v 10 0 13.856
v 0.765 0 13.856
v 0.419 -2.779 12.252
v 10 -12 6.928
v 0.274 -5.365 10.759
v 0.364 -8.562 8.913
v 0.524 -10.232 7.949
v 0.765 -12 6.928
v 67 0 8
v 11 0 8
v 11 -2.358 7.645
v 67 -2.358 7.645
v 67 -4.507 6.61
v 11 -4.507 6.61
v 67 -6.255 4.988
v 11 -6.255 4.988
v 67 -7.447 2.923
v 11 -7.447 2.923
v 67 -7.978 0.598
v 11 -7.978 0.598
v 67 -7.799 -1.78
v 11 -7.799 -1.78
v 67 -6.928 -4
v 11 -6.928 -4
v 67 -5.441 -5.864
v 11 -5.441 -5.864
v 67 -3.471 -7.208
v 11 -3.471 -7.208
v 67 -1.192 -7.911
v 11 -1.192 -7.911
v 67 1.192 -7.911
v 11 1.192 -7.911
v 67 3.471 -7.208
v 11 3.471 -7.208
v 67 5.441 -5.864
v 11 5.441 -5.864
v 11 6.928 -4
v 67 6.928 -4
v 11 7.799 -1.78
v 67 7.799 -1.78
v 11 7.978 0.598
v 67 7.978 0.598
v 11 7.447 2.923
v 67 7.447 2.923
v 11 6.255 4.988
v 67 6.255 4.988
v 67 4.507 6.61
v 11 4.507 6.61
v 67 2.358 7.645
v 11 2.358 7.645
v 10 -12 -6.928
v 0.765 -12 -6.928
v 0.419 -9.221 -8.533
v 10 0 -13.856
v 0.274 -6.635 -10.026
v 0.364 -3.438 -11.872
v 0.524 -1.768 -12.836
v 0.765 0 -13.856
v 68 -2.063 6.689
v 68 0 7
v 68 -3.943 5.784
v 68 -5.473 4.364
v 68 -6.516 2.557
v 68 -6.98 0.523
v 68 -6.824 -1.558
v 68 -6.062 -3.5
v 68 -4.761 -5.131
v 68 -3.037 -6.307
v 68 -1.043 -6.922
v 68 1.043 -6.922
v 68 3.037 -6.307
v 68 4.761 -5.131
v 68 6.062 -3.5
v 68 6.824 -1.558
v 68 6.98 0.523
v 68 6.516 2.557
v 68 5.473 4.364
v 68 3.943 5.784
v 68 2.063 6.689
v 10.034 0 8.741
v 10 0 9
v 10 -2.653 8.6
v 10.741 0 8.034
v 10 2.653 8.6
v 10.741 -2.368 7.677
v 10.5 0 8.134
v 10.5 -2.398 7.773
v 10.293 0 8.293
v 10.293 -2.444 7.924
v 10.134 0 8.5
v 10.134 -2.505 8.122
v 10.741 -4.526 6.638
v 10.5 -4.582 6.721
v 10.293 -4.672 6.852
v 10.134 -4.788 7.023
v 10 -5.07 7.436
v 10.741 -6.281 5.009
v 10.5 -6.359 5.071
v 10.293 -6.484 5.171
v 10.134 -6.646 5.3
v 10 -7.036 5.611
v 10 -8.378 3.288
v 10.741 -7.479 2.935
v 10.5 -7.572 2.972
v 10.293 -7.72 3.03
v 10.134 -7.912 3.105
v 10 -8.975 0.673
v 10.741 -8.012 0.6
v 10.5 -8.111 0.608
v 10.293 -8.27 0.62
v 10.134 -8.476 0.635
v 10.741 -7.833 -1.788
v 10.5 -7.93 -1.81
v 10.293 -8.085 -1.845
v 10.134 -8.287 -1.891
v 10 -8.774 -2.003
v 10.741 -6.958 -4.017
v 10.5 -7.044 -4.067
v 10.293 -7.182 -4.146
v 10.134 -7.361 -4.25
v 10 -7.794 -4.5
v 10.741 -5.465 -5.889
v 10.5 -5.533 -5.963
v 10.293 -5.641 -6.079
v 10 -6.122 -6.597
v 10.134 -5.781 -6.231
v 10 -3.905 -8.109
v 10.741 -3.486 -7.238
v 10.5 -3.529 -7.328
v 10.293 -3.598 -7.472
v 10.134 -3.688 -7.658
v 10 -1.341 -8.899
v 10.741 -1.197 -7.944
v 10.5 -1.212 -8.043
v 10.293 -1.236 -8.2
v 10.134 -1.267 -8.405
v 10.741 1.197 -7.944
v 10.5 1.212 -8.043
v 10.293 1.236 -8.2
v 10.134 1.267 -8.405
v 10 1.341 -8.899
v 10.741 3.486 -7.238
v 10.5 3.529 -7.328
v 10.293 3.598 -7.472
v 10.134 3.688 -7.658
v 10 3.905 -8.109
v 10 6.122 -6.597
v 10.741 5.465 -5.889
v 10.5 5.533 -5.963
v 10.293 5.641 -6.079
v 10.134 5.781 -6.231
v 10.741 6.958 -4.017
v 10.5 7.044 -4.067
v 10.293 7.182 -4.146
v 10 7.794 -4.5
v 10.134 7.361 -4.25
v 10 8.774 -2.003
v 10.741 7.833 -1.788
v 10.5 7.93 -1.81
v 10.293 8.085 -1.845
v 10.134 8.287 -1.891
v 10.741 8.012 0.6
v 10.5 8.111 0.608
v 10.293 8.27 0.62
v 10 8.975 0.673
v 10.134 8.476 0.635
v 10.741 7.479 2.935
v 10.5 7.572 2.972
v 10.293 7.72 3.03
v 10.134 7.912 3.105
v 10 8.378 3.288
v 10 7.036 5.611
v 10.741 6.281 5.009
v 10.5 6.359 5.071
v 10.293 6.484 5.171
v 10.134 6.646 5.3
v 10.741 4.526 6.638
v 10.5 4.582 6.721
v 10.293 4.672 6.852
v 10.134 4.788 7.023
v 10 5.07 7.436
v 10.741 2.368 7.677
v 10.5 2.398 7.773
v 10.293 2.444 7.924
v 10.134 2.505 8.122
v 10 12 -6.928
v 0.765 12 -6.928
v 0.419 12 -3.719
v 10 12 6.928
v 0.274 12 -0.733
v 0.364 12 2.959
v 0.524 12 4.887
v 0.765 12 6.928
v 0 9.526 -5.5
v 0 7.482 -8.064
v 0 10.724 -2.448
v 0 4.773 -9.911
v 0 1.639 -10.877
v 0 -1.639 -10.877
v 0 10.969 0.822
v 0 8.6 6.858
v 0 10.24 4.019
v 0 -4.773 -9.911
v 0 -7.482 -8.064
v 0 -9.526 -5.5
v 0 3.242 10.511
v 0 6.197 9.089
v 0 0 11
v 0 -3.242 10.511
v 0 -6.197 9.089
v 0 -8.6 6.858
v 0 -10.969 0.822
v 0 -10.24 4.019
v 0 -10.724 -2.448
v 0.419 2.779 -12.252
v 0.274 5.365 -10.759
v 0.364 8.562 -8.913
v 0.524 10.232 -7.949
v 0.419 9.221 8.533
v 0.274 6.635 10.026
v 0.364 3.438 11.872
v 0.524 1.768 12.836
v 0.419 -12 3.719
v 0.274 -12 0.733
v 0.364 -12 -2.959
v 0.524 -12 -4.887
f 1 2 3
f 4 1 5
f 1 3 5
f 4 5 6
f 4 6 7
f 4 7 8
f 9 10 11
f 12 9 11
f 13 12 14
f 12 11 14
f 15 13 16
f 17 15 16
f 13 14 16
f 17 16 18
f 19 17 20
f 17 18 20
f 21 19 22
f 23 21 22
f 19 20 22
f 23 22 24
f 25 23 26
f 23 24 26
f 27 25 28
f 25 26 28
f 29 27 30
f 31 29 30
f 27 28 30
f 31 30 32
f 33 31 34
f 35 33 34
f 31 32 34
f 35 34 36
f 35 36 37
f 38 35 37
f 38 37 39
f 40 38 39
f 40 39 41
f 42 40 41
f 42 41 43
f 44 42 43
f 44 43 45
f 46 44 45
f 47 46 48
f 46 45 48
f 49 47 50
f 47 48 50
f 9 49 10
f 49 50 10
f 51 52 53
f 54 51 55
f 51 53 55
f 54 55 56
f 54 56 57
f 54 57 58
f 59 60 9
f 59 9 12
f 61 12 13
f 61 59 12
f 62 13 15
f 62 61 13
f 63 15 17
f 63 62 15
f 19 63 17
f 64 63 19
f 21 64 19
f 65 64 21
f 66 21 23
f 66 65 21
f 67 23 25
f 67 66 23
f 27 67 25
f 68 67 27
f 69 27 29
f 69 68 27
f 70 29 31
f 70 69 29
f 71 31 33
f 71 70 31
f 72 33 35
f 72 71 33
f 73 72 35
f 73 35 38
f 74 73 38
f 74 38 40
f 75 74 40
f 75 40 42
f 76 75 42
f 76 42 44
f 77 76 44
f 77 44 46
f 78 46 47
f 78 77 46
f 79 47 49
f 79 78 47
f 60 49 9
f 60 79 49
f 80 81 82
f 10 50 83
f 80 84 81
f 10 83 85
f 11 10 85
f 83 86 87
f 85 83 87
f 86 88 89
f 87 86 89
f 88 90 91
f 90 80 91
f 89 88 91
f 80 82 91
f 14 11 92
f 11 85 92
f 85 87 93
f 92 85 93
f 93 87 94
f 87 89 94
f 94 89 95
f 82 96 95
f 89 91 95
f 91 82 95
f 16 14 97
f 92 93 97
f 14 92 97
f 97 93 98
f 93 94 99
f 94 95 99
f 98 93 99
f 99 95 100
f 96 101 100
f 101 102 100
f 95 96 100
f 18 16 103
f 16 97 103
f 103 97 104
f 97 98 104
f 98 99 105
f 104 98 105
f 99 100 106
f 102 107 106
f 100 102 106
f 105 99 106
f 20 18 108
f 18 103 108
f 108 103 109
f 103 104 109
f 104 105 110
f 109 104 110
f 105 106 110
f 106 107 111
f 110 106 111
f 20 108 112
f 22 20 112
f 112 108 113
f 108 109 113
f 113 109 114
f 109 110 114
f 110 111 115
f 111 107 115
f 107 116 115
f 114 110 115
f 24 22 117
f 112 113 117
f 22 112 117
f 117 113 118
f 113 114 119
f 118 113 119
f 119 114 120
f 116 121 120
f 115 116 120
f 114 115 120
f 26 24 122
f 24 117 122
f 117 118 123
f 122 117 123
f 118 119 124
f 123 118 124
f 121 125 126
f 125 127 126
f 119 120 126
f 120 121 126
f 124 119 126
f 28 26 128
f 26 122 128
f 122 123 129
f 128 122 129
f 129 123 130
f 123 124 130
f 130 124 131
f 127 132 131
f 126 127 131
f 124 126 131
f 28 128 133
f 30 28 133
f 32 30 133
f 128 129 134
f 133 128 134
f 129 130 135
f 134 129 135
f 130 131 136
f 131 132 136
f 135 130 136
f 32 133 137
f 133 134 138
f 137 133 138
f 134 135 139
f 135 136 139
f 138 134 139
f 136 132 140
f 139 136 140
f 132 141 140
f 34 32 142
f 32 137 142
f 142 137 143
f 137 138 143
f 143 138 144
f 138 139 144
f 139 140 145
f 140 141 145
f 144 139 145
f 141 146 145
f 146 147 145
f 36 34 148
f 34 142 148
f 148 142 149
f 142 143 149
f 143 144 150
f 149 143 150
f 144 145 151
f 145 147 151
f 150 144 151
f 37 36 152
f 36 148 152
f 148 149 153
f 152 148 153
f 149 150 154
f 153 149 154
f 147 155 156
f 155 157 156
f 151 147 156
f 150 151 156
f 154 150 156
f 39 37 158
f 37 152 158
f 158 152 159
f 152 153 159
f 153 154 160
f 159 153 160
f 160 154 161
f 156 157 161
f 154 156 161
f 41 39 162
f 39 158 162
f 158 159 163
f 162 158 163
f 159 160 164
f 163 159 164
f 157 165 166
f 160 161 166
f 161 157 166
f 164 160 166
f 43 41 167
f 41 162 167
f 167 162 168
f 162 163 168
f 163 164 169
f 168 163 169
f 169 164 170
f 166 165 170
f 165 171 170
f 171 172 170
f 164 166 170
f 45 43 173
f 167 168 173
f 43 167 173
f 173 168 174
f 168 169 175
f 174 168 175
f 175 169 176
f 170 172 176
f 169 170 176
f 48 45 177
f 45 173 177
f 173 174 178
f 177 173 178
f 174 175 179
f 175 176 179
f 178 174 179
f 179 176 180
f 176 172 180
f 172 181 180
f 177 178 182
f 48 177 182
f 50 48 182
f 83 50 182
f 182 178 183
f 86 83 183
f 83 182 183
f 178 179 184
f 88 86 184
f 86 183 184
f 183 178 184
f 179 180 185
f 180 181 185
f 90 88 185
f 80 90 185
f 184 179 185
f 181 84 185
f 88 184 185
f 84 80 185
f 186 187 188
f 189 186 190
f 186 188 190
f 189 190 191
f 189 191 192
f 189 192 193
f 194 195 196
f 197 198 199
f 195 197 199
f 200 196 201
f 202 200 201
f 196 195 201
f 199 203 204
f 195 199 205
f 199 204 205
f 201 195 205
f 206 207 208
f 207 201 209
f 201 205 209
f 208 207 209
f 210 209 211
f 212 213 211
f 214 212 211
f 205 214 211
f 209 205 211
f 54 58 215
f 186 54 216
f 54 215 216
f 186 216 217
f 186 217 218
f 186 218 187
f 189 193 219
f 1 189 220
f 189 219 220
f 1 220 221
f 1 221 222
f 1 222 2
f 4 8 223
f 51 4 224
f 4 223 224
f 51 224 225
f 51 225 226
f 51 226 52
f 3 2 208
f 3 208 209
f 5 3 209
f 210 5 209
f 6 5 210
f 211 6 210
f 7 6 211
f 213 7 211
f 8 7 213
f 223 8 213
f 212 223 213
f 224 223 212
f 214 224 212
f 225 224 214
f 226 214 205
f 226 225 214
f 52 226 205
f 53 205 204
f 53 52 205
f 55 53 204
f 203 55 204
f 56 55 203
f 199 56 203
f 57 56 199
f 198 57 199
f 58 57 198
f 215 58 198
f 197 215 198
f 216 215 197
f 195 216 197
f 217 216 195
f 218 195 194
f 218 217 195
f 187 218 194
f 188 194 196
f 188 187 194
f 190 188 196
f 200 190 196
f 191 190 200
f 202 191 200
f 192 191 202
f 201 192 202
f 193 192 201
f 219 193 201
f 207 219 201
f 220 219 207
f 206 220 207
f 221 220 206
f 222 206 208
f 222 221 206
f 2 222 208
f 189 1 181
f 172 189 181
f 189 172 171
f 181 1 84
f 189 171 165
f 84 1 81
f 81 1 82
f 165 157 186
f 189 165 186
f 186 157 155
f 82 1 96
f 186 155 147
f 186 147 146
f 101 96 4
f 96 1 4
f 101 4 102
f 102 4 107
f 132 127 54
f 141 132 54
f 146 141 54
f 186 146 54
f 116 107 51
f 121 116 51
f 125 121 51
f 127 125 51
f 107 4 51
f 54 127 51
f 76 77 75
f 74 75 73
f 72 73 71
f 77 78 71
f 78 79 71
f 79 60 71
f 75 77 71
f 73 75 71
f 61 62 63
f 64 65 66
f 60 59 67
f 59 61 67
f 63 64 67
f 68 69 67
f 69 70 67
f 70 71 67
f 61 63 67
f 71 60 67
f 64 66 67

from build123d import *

# Parameters (mm, degrees)
F2_R     = 14
F3_DEPTH = 25
F4_SIZE  = 1
F5_R     = 1


with BuildPart() as f1:
    # F0 (on Front) → F1 (revolve)
    with BuildSketch(Plane.XZ):
        Polygon((0, 14), (0, 0), (68, 0), (68, 8), (10, 8), (10, 14), align=None)
    revolve(axis=Axis((34, 0, 0), (1, 0, 0)))

    # F2 (on face) → F3 (cut)
    with BuildSketch(Plane(origin=(0, 0, 0), x_dir=(0, -1, 0), z_dir=(-1, 0, 0))):
        Circle(F2_R)
        Polygon((-12, 6.928203), (0, 13.856406), (12, 6.928203), (12, -6.928203), (0, -13.856406), (-12, -6.928203), align=None, mode=Mode.SUBTRACT)
    extrude(amount=-F3_DEPTH, mode=Mode.SUBTRACT)

    # F4
    f4_edges = [f1.edges().sort_by_distance(p)[0] for p in [
        (68, 0, -8),
    ]]
    chamfer(f4_edges, length=F4_SIZE)

    # F5
    f5_edges = [f1.edges().sort_by_distance(p)[0] for p in [
        (10, 0, -8),
    ]]
    fillet(f5_edges, radius=F5_R)

    # F6 (on Front) → F7 (revolve, cut)
    with BuildSketch(Plane.XZ):
        Polygon((0, 26.713991), (0, 11), (4.210551, 26.713991), align=None)
    revolve(axis=Axis((44.15636, 0, 0), (1, 0, 0)), mode=Mode.SUBTRACT)


solid = f1.part
